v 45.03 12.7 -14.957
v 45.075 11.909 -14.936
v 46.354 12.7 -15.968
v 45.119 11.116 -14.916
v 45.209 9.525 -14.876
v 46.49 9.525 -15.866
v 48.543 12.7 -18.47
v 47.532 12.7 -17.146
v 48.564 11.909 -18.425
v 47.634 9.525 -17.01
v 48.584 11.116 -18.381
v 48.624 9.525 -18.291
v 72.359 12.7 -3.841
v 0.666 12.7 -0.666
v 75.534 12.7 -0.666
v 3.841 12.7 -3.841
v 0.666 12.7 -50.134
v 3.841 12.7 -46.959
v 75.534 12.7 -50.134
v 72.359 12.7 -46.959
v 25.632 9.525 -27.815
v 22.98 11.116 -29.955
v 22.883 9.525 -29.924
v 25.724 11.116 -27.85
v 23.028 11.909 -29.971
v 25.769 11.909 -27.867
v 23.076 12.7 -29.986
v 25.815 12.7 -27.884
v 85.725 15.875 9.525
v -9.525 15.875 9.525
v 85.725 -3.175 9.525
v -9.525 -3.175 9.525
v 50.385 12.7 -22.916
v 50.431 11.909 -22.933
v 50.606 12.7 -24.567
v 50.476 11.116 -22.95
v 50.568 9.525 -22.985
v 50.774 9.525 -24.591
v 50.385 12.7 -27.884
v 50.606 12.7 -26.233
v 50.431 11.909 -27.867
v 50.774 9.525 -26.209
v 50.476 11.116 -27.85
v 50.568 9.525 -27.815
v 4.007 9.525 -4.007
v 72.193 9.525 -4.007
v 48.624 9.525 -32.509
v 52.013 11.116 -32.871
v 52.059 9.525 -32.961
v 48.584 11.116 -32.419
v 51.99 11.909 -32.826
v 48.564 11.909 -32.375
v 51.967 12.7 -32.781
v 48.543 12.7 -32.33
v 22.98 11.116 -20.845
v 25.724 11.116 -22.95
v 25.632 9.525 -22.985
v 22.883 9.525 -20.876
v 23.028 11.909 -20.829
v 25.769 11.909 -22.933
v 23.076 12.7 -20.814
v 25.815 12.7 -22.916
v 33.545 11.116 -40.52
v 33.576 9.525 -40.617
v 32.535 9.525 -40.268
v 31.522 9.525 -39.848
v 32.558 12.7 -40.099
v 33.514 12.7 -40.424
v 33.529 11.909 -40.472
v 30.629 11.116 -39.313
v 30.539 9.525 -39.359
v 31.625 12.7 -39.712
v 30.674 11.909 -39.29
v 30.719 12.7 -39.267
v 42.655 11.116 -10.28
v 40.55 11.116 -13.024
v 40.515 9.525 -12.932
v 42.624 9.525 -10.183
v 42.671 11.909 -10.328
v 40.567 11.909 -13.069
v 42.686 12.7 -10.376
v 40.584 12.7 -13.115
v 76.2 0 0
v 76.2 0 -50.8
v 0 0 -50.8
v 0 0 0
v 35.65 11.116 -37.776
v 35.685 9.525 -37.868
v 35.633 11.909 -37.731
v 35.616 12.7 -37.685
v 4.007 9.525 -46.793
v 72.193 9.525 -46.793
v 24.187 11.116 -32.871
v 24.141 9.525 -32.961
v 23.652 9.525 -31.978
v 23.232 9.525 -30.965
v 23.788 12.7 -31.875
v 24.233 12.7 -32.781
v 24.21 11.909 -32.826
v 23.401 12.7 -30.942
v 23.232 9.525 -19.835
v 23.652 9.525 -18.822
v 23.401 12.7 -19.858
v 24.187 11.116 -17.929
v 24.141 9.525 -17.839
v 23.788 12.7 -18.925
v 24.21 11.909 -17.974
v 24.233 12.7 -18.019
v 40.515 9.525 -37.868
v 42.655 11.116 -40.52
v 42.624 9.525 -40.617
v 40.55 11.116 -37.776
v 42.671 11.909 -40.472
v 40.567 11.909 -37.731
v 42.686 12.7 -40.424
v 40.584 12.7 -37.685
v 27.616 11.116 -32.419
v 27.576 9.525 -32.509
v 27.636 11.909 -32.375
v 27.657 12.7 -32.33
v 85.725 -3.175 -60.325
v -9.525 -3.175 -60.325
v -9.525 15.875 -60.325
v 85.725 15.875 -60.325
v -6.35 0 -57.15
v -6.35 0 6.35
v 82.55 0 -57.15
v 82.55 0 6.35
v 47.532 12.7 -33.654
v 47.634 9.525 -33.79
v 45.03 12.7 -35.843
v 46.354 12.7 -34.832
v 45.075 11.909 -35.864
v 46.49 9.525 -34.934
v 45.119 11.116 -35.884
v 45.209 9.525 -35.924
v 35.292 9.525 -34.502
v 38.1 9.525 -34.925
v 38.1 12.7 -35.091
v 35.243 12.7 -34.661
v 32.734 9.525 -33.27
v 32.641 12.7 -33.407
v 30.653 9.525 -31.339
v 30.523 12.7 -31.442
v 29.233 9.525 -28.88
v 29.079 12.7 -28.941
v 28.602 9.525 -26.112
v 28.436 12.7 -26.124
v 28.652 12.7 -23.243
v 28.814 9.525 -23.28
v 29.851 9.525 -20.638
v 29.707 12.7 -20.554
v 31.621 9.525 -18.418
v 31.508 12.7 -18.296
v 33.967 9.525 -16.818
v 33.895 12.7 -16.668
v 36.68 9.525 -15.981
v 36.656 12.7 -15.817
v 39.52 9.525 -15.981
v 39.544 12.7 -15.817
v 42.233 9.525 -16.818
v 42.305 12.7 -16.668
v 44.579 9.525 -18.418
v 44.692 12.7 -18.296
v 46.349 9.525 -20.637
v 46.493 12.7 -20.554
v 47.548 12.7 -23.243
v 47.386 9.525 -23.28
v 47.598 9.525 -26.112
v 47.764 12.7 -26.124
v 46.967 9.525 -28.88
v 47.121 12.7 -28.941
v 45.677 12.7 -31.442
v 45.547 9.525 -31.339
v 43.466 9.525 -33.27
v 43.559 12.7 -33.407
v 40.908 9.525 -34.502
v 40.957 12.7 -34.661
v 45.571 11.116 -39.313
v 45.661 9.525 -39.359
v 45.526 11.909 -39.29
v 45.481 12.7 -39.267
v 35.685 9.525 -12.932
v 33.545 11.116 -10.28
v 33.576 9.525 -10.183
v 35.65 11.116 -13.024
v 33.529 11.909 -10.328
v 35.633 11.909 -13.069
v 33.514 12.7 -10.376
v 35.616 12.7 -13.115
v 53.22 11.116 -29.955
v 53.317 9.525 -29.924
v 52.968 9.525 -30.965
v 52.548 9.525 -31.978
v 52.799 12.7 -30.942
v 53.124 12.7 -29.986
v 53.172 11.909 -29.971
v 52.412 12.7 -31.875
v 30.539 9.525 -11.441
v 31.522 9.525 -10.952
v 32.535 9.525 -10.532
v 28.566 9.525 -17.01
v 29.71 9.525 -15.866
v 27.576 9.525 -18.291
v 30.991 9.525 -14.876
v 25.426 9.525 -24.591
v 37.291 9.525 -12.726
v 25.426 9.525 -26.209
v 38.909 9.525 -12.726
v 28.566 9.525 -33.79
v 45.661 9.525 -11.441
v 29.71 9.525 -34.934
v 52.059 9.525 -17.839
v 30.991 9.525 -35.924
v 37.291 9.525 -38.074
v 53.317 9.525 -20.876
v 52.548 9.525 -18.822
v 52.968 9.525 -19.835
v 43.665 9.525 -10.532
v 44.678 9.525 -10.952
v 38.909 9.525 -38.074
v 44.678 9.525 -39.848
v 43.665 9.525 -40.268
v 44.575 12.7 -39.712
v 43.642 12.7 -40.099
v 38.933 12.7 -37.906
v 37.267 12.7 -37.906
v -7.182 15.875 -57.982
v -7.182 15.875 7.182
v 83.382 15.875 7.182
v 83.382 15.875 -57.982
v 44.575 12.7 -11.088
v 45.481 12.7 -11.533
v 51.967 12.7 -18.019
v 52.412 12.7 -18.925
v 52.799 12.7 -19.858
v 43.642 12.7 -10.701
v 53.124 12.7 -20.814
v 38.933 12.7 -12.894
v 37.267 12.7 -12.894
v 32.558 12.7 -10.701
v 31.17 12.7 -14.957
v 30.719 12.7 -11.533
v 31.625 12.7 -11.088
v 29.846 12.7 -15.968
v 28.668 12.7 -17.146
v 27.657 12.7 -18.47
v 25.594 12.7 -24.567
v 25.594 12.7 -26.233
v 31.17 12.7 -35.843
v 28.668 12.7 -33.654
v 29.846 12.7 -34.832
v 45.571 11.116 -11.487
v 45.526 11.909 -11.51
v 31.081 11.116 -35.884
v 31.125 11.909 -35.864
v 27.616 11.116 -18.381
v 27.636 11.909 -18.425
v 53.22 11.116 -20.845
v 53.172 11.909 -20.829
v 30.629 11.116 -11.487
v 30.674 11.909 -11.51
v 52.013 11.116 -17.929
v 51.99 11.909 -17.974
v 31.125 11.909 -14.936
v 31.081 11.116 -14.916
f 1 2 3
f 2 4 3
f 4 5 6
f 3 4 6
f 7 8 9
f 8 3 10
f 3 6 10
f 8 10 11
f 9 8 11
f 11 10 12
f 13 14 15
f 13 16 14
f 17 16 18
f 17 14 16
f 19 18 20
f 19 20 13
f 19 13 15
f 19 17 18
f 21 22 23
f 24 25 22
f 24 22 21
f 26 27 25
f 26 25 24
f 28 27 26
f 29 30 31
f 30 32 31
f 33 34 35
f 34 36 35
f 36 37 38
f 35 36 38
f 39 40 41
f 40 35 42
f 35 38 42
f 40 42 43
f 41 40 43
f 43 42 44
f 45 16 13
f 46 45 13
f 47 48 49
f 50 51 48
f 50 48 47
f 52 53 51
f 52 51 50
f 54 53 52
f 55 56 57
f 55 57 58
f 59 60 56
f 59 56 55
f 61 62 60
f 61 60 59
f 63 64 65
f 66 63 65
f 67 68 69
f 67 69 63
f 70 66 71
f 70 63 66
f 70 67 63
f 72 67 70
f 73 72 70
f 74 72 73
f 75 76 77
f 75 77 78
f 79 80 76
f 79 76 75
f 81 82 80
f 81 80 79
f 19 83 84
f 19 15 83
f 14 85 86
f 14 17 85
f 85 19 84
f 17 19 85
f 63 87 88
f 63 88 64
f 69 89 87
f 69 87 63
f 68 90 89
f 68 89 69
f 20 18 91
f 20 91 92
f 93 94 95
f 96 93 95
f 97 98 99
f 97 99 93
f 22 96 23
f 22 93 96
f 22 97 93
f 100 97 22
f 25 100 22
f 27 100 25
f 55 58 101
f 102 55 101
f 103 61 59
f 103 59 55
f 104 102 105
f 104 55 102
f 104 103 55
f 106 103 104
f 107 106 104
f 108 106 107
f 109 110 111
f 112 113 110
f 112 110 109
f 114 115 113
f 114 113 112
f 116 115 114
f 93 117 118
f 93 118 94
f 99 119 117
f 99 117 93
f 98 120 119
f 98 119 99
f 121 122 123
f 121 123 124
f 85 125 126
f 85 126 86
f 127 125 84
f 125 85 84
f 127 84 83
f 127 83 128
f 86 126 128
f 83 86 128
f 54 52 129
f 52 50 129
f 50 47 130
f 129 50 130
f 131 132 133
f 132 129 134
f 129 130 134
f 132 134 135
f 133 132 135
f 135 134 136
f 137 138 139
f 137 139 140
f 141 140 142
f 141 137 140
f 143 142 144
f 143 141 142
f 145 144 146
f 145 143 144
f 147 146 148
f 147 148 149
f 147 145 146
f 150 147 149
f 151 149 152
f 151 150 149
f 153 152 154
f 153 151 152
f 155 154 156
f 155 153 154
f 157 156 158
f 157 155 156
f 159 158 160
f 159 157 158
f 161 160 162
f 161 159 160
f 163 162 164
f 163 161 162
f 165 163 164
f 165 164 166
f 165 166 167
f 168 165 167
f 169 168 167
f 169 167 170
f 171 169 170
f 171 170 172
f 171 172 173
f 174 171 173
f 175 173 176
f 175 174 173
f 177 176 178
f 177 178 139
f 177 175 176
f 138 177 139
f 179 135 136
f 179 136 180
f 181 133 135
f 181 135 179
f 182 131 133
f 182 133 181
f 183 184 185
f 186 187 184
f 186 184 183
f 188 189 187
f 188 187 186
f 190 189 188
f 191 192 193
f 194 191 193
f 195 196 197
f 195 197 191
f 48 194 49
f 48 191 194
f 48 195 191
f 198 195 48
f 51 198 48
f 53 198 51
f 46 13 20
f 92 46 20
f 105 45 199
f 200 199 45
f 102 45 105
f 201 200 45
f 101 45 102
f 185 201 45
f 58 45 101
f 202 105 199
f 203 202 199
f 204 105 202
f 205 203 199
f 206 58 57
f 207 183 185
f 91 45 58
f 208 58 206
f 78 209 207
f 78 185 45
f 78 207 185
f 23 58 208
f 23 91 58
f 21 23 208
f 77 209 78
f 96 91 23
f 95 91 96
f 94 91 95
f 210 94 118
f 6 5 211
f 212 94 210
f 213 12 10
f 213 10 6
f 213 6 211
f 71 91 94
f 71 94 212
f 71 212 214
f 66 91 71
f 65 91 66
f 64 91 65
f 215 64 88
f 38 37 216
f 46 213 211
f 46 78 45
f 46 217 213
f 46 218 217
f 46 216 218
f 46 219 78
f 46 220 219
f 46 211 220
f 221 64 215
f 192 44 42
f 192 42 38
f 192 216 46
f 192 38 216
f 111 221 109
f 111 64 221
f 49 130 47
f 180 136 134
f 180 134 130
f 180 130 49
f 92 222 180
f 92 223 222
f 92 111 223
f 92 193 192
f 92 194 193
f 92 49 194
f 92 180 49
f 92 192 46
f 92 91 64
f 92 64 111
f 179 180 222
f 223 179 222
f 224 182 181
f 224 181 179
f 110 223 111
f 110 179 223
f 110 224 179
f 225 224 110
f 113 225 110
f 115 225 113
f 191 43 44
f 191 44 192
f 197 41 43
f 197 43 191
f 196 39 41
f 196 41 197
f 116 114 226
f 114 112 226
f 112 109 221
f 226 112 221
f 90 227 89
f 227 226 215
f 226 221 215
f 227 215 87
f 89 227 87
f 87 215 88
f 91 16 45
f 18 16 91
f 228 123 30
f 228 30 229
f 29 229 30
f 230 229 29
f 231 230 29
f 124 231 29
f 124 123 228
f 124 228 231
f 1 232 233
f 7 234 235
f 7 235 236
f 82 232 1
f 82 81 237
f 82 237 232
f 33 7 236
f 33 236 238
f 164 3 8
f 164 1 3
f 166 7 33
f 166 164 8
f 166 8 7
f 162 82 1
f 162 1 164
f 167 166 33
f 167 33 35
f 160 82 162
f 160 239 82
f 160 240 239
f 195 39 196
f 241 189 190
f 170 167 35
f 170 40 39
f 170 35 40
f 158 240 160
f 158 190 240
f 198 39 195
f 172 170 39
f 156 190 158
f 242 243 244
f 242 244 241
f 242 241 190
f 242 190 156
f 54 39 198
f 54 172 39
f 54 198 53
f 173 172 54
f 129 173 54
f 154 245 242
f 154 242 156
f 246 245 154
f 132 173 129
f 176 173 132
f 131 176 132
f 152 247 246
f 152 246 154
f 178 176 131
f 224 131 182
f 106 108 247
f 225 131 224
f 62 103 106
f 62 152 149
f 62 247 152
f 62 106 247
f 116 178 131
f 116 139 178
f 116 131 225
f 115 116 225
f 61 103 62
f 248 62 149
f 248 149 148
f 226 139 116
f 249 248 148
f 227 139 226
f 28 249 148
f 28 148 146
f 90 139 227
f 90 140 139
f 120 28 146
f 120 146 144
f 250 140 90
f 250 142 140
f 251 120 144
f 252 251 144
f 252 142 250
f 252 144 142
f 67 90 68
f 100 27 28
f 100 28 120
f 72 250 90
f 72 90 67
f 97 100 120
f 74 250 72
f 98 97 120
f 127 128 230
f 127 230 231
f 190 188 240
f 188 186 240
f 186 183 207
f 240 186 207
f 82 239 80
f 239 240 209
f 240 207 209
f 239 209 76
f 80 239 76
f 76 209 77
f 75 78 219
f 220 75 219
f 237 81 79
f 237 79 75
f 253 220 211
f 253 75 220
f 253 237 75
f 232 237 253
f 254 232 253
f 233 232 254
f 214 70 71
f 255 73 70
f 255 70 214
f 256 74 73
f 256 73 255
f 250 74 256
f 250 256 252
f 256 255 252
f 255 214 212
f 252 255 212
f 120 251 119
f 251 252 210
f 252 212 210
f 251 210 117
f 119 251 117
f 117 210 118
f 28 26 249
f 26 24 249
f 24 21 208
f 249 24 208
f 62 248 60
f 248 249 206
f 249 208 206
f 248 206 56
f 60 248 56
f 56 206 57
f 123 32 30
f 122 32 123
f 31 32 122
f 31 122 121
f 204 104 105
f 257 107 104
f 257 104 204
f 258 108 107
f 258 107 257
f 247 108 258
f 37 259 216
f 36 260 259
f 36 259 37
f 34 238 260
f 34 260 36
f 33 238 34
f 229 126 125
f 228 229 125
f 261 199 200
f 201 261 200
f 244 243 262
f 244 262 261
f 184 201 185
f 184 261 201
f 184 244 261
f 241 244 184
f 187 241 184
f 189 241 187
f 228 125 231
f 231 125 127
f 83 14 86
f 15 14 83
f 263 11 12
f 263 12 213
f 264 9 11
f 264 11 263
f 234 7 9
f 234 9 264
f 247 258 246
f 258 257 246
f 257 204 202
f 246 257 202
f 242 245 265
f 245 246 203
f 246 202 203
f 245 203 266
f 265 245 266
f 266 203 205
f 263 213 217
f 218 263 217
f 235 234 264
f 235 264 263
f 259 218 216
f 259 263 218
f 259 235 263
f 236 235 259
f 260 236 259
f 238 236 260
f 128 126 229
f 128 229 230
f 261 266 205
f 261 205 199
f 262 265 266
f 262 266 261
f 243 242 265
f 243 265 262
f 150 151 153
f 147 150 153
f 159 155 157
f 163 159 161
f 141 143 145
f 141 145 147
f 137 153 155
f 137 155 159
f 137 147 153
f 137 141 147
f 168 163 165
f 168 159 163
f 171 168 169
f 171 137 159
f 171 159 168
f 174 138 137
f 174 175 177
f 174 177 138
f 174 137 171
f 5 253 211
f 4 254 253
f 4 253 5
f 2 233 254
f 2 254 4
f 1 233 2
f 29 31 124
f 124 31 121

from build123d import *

# Parameters (mm, degrees)
SKETCH1_W           = 76.2
SKETCH1_H           = 50.8
BOSS_EXTRUDE1_DEPTH = 12.7
BOSS_EXTRUDE1_TAPER = 3
SKETCH2_W           = 95.25
SKETCH2_H           = 69.85
BOSS_EXTRUDE2_DEPTH = 3.175
SKETCH3_W           = 95.25
SKETCH3_H           = 69.85
SKETCH3_W_2         = 88.9
SKETCH3_H_2         = 63.5
BOSS_EXTRUDE3_DEPTH = 15.875
DRAFT1_ANGLE        = 3
SKETCH4_W           = 68.518842406
SKETCH4_H           = 43.118842406
CUT_EXTRUDE1_DEPTH  = 3.175
CUT_EXTRUDE1_DRAFT  = -3
SKETCH6_R           = 12.7
SKETCH6_R_2         = 9.525
BOSS_EXTRUDE5_DEPTH = 3.175
BOSS_EXTRUDE6_REACH = 108.018
CIRPATTERN1_COUNT   = 8
DRAFT2_ANGLE        = 3


with BuildPart() as part:
    # Sketch1 → Boss-Extrude1 (new body)
    with BuildSketch(Plane(origin=(0, 0, 0), x_dir=(1, 0, 0), z_dir=(0, 1, 0))):
        with Locations((38.1, 25.4)):
            Rectangle(SKETCH1_W, SKETCH1_H)
    extrude(amount=BOSS_EXTRUDE1_DEPTH, taper=BOSS_EXTRUDE1_TAPER)

    # Sketch2 → Boss-Extrude2 (add)
    with BuildSketch(Plane.XZ):
        with Locations((38.1, -25.4)):
            Rectangle(SKETCH2_W, SKETCH2_H)
    extrude(amount=BOSS_EXTRUDE2_DEPTH)

    # Sketch3 → Boss-Extrude3 (add)
    with BuildSketch(Plane(origin=(0, 0, 0), x_dir=(1, 0, 0), z_dir=(0, 1, 0))):
        with Locations((38.1, 25.4)):
            Rectangle(SKETCH3_W, SKETCH3_H)
        with Locations((38.1, 25.4)):
            Rectangle(SKETCH3_W_2, SKETCH3_H_2, mode=Mode.SUBTRACT)
    extrude(amount=BOSS_EXTRUDE3_DEPTH)

    # Draft1
    draft1_faces = [part.faces().sort_by_distance(p)[0] for p in [
        (82.55, 7.9375, -25.4),
        (38.1, 7.9375, -57.15),
        (38.1, 7.9375, 6.35),
        (-6.35, 7.9375, -25.4),
    ]]
    draft(draft1_faces, Plane.ZX, DRAFT1_ANGLE)


with BuildPart() as cut_extrude1_tool:
    # Sketch4 → Cut-Extrude1 (with draft: the straight prism first)
    with BuildSketch(Plane(origin=(0, 12.7, 0), x_dir=(1, 0, 0), z_dir=(0, 1, 0))):
        with Locations((38.1, 25.4)):
            Rectangle(SKETCH4_W, SKETCH4_H)
    extrude(amount=-CUT_EXTRUDE1_DEPTH)
    # Cut-Extrude1: the draft: its side faces are tilted about the plane it starts from
    cut_extrude1_sides = [cut_extrude1_tool.faces().sort_by_distance(p)[0] for p in [
        (3.840578797, 11.1125, -25.4),
        (38.1, 11.1125, -3.840578797),
        (72.359421203, 11.1125, -25.4),
        (38.1, 11.1125, -46.959421203),
    ]]
    draft(cut_extrude1_sides, Plane(origin=(0, 12.7, 0), x_dir=(1, 0, 0), z_dir=(0, 1, 0)), CUT_EXTRUDE1_DRAFT)


with BuildPart() as part_1:
    add(part.part)

    # Cut-Extrude1: cut by cut_extrude1_tool
    add(cut_extrude1_tool.part, mode=Mode.SUBTRACT)

    # Sketch6 → Boss-Extrude5 (add)
    with BuildSketch(Plane(origin=(0, 9.525, 0), x_dir=(1, 0, 0), z_dir=(0, 1, 0))):
        with Locations(Location((38.1, 25.4, 0), (0, 0, 90))):
            Circle(SKETCH6_R)
        with Locations(Location((38.1, 25.4, 0), (0, 0, 90))):
            Circle(SKETCH6_R_2, mode=Mode.SUBTRACT)
    extrude(amount=BOSS_EXTRUDE5_DEPTH)

    # Sketch7 → Boss-Extrude6 (add, up to next)
    with BuildSketch(Plane(origin=(0, 12.7, 0), x_dir=(1, 0, 0), z_dir=(0, 1, 0)), mode=Mode.PRIVATE) as boss_extrude6_sk1:
        with BuildLine():
            Line((42.624193754, 40.616678214), (40.51523203, 37.868225786))
            ThreePointArc((40.51523203, 37.868225786), (42.960079591, 37.133270063), (45.208540056, 35.924193949))
            Line((45.208540056, 35.924193949), (45.66072827, 39.358904435))
            ThreePointArc((45.66072827, 39.358904435), (44.175099489, 40.066587579), (42.624193754, 40.616678214))
        make_face()
    boss_extrude6_tool1 = extrude(boss_extrude6_sk1.sketch, amount=-BOSS_EXTRUDE6_REACH, mode=Mode.PRIVATE) - part_1.part
    boss_extrude6 = boss_extrude6_tool1.solids().sort_by_distance((43.502556, 12.7, -38.442924))[0]
    add(boss_extrude6)

    # CirPattern1: Boss-Extrude6 ×8 about axis
    cirpattern1_axis = Axis((38.1, 0, -25.4), (0, 1, 0))
    for i in range(1, CIRPATTERN1_COUNT):
        add(boss_extrude6.rotate(cirpattern1_axis, i * 360 / CIRPATTERN1_COUNT))

    # Draft2
    draft2_faces = [part_1.faces().sort_by_distance(p)[0] for p in [
        (30.765365837, 11.1125, -37.641549192),
        (32.024900511, 11.1125, -40.066587579),
        (34.630287108, 11.1125, -39.242452),
        (50.8, 11.1125, -25.4),
        (38.1, 11.1125, -15.875),
        (47.080256121, 11.1125, -34.380256121),
        (45.434634163, 11.1125, -37.641549192),
        (44.175099489, 11.1125, -40.066587579),
        (41.569712892, 11.1125, -39.242452),
        (38.1, 11.1125, -38.1),
        (51.942452, 11.1125, -28.869712892),
        (52.766587579, 11.1125, -31.475099489),
        (50.341549192, 11.1125, -32.734634163),
        (47.080256121, 11.1125, -16.419743879),
        (50.341549192, 11.1125, -18.065365837),
        (41.569712892, 11.1125, -11.557548),
        (52.766587579, 11.1125, -19.324900511),
        (51.942452, 11.1125, -21.930287108),
        (38.1, 11.1125, -12.7),
        (44.175099489, 11.1125, -10.733412421),
        (45.434634163, 11.1125, -13.158450808),
        (29.119743879, 11.1125, -16.419743879),
        (30.765365837, 11.1125, -13.158450808),
        (32.024900511, 11.1125, -10.733412421),
        (34.630287108, 11.1125, -11.557548),
        (25.4, 11.1125, -25.4),
        (24.257548, 11.1125, -21.930287108),
        (23.433412421, 11.1125, -19.324900511),
        (25.858450808, 11.1125, -18.065365837),
        (29.119743879, 11.1125, -34.380256121),
        (25.858450808, 11.1125, -32.734634163),
        (23.433412421, 11.1125, -31.475099489),
        (24.257548, 11.1125, -28.869712892),
    ]]
    draft(draft2_faces, Plane.ZX.offset(9.525), DRAFT2_ANGLE)


solid = part_1.part
